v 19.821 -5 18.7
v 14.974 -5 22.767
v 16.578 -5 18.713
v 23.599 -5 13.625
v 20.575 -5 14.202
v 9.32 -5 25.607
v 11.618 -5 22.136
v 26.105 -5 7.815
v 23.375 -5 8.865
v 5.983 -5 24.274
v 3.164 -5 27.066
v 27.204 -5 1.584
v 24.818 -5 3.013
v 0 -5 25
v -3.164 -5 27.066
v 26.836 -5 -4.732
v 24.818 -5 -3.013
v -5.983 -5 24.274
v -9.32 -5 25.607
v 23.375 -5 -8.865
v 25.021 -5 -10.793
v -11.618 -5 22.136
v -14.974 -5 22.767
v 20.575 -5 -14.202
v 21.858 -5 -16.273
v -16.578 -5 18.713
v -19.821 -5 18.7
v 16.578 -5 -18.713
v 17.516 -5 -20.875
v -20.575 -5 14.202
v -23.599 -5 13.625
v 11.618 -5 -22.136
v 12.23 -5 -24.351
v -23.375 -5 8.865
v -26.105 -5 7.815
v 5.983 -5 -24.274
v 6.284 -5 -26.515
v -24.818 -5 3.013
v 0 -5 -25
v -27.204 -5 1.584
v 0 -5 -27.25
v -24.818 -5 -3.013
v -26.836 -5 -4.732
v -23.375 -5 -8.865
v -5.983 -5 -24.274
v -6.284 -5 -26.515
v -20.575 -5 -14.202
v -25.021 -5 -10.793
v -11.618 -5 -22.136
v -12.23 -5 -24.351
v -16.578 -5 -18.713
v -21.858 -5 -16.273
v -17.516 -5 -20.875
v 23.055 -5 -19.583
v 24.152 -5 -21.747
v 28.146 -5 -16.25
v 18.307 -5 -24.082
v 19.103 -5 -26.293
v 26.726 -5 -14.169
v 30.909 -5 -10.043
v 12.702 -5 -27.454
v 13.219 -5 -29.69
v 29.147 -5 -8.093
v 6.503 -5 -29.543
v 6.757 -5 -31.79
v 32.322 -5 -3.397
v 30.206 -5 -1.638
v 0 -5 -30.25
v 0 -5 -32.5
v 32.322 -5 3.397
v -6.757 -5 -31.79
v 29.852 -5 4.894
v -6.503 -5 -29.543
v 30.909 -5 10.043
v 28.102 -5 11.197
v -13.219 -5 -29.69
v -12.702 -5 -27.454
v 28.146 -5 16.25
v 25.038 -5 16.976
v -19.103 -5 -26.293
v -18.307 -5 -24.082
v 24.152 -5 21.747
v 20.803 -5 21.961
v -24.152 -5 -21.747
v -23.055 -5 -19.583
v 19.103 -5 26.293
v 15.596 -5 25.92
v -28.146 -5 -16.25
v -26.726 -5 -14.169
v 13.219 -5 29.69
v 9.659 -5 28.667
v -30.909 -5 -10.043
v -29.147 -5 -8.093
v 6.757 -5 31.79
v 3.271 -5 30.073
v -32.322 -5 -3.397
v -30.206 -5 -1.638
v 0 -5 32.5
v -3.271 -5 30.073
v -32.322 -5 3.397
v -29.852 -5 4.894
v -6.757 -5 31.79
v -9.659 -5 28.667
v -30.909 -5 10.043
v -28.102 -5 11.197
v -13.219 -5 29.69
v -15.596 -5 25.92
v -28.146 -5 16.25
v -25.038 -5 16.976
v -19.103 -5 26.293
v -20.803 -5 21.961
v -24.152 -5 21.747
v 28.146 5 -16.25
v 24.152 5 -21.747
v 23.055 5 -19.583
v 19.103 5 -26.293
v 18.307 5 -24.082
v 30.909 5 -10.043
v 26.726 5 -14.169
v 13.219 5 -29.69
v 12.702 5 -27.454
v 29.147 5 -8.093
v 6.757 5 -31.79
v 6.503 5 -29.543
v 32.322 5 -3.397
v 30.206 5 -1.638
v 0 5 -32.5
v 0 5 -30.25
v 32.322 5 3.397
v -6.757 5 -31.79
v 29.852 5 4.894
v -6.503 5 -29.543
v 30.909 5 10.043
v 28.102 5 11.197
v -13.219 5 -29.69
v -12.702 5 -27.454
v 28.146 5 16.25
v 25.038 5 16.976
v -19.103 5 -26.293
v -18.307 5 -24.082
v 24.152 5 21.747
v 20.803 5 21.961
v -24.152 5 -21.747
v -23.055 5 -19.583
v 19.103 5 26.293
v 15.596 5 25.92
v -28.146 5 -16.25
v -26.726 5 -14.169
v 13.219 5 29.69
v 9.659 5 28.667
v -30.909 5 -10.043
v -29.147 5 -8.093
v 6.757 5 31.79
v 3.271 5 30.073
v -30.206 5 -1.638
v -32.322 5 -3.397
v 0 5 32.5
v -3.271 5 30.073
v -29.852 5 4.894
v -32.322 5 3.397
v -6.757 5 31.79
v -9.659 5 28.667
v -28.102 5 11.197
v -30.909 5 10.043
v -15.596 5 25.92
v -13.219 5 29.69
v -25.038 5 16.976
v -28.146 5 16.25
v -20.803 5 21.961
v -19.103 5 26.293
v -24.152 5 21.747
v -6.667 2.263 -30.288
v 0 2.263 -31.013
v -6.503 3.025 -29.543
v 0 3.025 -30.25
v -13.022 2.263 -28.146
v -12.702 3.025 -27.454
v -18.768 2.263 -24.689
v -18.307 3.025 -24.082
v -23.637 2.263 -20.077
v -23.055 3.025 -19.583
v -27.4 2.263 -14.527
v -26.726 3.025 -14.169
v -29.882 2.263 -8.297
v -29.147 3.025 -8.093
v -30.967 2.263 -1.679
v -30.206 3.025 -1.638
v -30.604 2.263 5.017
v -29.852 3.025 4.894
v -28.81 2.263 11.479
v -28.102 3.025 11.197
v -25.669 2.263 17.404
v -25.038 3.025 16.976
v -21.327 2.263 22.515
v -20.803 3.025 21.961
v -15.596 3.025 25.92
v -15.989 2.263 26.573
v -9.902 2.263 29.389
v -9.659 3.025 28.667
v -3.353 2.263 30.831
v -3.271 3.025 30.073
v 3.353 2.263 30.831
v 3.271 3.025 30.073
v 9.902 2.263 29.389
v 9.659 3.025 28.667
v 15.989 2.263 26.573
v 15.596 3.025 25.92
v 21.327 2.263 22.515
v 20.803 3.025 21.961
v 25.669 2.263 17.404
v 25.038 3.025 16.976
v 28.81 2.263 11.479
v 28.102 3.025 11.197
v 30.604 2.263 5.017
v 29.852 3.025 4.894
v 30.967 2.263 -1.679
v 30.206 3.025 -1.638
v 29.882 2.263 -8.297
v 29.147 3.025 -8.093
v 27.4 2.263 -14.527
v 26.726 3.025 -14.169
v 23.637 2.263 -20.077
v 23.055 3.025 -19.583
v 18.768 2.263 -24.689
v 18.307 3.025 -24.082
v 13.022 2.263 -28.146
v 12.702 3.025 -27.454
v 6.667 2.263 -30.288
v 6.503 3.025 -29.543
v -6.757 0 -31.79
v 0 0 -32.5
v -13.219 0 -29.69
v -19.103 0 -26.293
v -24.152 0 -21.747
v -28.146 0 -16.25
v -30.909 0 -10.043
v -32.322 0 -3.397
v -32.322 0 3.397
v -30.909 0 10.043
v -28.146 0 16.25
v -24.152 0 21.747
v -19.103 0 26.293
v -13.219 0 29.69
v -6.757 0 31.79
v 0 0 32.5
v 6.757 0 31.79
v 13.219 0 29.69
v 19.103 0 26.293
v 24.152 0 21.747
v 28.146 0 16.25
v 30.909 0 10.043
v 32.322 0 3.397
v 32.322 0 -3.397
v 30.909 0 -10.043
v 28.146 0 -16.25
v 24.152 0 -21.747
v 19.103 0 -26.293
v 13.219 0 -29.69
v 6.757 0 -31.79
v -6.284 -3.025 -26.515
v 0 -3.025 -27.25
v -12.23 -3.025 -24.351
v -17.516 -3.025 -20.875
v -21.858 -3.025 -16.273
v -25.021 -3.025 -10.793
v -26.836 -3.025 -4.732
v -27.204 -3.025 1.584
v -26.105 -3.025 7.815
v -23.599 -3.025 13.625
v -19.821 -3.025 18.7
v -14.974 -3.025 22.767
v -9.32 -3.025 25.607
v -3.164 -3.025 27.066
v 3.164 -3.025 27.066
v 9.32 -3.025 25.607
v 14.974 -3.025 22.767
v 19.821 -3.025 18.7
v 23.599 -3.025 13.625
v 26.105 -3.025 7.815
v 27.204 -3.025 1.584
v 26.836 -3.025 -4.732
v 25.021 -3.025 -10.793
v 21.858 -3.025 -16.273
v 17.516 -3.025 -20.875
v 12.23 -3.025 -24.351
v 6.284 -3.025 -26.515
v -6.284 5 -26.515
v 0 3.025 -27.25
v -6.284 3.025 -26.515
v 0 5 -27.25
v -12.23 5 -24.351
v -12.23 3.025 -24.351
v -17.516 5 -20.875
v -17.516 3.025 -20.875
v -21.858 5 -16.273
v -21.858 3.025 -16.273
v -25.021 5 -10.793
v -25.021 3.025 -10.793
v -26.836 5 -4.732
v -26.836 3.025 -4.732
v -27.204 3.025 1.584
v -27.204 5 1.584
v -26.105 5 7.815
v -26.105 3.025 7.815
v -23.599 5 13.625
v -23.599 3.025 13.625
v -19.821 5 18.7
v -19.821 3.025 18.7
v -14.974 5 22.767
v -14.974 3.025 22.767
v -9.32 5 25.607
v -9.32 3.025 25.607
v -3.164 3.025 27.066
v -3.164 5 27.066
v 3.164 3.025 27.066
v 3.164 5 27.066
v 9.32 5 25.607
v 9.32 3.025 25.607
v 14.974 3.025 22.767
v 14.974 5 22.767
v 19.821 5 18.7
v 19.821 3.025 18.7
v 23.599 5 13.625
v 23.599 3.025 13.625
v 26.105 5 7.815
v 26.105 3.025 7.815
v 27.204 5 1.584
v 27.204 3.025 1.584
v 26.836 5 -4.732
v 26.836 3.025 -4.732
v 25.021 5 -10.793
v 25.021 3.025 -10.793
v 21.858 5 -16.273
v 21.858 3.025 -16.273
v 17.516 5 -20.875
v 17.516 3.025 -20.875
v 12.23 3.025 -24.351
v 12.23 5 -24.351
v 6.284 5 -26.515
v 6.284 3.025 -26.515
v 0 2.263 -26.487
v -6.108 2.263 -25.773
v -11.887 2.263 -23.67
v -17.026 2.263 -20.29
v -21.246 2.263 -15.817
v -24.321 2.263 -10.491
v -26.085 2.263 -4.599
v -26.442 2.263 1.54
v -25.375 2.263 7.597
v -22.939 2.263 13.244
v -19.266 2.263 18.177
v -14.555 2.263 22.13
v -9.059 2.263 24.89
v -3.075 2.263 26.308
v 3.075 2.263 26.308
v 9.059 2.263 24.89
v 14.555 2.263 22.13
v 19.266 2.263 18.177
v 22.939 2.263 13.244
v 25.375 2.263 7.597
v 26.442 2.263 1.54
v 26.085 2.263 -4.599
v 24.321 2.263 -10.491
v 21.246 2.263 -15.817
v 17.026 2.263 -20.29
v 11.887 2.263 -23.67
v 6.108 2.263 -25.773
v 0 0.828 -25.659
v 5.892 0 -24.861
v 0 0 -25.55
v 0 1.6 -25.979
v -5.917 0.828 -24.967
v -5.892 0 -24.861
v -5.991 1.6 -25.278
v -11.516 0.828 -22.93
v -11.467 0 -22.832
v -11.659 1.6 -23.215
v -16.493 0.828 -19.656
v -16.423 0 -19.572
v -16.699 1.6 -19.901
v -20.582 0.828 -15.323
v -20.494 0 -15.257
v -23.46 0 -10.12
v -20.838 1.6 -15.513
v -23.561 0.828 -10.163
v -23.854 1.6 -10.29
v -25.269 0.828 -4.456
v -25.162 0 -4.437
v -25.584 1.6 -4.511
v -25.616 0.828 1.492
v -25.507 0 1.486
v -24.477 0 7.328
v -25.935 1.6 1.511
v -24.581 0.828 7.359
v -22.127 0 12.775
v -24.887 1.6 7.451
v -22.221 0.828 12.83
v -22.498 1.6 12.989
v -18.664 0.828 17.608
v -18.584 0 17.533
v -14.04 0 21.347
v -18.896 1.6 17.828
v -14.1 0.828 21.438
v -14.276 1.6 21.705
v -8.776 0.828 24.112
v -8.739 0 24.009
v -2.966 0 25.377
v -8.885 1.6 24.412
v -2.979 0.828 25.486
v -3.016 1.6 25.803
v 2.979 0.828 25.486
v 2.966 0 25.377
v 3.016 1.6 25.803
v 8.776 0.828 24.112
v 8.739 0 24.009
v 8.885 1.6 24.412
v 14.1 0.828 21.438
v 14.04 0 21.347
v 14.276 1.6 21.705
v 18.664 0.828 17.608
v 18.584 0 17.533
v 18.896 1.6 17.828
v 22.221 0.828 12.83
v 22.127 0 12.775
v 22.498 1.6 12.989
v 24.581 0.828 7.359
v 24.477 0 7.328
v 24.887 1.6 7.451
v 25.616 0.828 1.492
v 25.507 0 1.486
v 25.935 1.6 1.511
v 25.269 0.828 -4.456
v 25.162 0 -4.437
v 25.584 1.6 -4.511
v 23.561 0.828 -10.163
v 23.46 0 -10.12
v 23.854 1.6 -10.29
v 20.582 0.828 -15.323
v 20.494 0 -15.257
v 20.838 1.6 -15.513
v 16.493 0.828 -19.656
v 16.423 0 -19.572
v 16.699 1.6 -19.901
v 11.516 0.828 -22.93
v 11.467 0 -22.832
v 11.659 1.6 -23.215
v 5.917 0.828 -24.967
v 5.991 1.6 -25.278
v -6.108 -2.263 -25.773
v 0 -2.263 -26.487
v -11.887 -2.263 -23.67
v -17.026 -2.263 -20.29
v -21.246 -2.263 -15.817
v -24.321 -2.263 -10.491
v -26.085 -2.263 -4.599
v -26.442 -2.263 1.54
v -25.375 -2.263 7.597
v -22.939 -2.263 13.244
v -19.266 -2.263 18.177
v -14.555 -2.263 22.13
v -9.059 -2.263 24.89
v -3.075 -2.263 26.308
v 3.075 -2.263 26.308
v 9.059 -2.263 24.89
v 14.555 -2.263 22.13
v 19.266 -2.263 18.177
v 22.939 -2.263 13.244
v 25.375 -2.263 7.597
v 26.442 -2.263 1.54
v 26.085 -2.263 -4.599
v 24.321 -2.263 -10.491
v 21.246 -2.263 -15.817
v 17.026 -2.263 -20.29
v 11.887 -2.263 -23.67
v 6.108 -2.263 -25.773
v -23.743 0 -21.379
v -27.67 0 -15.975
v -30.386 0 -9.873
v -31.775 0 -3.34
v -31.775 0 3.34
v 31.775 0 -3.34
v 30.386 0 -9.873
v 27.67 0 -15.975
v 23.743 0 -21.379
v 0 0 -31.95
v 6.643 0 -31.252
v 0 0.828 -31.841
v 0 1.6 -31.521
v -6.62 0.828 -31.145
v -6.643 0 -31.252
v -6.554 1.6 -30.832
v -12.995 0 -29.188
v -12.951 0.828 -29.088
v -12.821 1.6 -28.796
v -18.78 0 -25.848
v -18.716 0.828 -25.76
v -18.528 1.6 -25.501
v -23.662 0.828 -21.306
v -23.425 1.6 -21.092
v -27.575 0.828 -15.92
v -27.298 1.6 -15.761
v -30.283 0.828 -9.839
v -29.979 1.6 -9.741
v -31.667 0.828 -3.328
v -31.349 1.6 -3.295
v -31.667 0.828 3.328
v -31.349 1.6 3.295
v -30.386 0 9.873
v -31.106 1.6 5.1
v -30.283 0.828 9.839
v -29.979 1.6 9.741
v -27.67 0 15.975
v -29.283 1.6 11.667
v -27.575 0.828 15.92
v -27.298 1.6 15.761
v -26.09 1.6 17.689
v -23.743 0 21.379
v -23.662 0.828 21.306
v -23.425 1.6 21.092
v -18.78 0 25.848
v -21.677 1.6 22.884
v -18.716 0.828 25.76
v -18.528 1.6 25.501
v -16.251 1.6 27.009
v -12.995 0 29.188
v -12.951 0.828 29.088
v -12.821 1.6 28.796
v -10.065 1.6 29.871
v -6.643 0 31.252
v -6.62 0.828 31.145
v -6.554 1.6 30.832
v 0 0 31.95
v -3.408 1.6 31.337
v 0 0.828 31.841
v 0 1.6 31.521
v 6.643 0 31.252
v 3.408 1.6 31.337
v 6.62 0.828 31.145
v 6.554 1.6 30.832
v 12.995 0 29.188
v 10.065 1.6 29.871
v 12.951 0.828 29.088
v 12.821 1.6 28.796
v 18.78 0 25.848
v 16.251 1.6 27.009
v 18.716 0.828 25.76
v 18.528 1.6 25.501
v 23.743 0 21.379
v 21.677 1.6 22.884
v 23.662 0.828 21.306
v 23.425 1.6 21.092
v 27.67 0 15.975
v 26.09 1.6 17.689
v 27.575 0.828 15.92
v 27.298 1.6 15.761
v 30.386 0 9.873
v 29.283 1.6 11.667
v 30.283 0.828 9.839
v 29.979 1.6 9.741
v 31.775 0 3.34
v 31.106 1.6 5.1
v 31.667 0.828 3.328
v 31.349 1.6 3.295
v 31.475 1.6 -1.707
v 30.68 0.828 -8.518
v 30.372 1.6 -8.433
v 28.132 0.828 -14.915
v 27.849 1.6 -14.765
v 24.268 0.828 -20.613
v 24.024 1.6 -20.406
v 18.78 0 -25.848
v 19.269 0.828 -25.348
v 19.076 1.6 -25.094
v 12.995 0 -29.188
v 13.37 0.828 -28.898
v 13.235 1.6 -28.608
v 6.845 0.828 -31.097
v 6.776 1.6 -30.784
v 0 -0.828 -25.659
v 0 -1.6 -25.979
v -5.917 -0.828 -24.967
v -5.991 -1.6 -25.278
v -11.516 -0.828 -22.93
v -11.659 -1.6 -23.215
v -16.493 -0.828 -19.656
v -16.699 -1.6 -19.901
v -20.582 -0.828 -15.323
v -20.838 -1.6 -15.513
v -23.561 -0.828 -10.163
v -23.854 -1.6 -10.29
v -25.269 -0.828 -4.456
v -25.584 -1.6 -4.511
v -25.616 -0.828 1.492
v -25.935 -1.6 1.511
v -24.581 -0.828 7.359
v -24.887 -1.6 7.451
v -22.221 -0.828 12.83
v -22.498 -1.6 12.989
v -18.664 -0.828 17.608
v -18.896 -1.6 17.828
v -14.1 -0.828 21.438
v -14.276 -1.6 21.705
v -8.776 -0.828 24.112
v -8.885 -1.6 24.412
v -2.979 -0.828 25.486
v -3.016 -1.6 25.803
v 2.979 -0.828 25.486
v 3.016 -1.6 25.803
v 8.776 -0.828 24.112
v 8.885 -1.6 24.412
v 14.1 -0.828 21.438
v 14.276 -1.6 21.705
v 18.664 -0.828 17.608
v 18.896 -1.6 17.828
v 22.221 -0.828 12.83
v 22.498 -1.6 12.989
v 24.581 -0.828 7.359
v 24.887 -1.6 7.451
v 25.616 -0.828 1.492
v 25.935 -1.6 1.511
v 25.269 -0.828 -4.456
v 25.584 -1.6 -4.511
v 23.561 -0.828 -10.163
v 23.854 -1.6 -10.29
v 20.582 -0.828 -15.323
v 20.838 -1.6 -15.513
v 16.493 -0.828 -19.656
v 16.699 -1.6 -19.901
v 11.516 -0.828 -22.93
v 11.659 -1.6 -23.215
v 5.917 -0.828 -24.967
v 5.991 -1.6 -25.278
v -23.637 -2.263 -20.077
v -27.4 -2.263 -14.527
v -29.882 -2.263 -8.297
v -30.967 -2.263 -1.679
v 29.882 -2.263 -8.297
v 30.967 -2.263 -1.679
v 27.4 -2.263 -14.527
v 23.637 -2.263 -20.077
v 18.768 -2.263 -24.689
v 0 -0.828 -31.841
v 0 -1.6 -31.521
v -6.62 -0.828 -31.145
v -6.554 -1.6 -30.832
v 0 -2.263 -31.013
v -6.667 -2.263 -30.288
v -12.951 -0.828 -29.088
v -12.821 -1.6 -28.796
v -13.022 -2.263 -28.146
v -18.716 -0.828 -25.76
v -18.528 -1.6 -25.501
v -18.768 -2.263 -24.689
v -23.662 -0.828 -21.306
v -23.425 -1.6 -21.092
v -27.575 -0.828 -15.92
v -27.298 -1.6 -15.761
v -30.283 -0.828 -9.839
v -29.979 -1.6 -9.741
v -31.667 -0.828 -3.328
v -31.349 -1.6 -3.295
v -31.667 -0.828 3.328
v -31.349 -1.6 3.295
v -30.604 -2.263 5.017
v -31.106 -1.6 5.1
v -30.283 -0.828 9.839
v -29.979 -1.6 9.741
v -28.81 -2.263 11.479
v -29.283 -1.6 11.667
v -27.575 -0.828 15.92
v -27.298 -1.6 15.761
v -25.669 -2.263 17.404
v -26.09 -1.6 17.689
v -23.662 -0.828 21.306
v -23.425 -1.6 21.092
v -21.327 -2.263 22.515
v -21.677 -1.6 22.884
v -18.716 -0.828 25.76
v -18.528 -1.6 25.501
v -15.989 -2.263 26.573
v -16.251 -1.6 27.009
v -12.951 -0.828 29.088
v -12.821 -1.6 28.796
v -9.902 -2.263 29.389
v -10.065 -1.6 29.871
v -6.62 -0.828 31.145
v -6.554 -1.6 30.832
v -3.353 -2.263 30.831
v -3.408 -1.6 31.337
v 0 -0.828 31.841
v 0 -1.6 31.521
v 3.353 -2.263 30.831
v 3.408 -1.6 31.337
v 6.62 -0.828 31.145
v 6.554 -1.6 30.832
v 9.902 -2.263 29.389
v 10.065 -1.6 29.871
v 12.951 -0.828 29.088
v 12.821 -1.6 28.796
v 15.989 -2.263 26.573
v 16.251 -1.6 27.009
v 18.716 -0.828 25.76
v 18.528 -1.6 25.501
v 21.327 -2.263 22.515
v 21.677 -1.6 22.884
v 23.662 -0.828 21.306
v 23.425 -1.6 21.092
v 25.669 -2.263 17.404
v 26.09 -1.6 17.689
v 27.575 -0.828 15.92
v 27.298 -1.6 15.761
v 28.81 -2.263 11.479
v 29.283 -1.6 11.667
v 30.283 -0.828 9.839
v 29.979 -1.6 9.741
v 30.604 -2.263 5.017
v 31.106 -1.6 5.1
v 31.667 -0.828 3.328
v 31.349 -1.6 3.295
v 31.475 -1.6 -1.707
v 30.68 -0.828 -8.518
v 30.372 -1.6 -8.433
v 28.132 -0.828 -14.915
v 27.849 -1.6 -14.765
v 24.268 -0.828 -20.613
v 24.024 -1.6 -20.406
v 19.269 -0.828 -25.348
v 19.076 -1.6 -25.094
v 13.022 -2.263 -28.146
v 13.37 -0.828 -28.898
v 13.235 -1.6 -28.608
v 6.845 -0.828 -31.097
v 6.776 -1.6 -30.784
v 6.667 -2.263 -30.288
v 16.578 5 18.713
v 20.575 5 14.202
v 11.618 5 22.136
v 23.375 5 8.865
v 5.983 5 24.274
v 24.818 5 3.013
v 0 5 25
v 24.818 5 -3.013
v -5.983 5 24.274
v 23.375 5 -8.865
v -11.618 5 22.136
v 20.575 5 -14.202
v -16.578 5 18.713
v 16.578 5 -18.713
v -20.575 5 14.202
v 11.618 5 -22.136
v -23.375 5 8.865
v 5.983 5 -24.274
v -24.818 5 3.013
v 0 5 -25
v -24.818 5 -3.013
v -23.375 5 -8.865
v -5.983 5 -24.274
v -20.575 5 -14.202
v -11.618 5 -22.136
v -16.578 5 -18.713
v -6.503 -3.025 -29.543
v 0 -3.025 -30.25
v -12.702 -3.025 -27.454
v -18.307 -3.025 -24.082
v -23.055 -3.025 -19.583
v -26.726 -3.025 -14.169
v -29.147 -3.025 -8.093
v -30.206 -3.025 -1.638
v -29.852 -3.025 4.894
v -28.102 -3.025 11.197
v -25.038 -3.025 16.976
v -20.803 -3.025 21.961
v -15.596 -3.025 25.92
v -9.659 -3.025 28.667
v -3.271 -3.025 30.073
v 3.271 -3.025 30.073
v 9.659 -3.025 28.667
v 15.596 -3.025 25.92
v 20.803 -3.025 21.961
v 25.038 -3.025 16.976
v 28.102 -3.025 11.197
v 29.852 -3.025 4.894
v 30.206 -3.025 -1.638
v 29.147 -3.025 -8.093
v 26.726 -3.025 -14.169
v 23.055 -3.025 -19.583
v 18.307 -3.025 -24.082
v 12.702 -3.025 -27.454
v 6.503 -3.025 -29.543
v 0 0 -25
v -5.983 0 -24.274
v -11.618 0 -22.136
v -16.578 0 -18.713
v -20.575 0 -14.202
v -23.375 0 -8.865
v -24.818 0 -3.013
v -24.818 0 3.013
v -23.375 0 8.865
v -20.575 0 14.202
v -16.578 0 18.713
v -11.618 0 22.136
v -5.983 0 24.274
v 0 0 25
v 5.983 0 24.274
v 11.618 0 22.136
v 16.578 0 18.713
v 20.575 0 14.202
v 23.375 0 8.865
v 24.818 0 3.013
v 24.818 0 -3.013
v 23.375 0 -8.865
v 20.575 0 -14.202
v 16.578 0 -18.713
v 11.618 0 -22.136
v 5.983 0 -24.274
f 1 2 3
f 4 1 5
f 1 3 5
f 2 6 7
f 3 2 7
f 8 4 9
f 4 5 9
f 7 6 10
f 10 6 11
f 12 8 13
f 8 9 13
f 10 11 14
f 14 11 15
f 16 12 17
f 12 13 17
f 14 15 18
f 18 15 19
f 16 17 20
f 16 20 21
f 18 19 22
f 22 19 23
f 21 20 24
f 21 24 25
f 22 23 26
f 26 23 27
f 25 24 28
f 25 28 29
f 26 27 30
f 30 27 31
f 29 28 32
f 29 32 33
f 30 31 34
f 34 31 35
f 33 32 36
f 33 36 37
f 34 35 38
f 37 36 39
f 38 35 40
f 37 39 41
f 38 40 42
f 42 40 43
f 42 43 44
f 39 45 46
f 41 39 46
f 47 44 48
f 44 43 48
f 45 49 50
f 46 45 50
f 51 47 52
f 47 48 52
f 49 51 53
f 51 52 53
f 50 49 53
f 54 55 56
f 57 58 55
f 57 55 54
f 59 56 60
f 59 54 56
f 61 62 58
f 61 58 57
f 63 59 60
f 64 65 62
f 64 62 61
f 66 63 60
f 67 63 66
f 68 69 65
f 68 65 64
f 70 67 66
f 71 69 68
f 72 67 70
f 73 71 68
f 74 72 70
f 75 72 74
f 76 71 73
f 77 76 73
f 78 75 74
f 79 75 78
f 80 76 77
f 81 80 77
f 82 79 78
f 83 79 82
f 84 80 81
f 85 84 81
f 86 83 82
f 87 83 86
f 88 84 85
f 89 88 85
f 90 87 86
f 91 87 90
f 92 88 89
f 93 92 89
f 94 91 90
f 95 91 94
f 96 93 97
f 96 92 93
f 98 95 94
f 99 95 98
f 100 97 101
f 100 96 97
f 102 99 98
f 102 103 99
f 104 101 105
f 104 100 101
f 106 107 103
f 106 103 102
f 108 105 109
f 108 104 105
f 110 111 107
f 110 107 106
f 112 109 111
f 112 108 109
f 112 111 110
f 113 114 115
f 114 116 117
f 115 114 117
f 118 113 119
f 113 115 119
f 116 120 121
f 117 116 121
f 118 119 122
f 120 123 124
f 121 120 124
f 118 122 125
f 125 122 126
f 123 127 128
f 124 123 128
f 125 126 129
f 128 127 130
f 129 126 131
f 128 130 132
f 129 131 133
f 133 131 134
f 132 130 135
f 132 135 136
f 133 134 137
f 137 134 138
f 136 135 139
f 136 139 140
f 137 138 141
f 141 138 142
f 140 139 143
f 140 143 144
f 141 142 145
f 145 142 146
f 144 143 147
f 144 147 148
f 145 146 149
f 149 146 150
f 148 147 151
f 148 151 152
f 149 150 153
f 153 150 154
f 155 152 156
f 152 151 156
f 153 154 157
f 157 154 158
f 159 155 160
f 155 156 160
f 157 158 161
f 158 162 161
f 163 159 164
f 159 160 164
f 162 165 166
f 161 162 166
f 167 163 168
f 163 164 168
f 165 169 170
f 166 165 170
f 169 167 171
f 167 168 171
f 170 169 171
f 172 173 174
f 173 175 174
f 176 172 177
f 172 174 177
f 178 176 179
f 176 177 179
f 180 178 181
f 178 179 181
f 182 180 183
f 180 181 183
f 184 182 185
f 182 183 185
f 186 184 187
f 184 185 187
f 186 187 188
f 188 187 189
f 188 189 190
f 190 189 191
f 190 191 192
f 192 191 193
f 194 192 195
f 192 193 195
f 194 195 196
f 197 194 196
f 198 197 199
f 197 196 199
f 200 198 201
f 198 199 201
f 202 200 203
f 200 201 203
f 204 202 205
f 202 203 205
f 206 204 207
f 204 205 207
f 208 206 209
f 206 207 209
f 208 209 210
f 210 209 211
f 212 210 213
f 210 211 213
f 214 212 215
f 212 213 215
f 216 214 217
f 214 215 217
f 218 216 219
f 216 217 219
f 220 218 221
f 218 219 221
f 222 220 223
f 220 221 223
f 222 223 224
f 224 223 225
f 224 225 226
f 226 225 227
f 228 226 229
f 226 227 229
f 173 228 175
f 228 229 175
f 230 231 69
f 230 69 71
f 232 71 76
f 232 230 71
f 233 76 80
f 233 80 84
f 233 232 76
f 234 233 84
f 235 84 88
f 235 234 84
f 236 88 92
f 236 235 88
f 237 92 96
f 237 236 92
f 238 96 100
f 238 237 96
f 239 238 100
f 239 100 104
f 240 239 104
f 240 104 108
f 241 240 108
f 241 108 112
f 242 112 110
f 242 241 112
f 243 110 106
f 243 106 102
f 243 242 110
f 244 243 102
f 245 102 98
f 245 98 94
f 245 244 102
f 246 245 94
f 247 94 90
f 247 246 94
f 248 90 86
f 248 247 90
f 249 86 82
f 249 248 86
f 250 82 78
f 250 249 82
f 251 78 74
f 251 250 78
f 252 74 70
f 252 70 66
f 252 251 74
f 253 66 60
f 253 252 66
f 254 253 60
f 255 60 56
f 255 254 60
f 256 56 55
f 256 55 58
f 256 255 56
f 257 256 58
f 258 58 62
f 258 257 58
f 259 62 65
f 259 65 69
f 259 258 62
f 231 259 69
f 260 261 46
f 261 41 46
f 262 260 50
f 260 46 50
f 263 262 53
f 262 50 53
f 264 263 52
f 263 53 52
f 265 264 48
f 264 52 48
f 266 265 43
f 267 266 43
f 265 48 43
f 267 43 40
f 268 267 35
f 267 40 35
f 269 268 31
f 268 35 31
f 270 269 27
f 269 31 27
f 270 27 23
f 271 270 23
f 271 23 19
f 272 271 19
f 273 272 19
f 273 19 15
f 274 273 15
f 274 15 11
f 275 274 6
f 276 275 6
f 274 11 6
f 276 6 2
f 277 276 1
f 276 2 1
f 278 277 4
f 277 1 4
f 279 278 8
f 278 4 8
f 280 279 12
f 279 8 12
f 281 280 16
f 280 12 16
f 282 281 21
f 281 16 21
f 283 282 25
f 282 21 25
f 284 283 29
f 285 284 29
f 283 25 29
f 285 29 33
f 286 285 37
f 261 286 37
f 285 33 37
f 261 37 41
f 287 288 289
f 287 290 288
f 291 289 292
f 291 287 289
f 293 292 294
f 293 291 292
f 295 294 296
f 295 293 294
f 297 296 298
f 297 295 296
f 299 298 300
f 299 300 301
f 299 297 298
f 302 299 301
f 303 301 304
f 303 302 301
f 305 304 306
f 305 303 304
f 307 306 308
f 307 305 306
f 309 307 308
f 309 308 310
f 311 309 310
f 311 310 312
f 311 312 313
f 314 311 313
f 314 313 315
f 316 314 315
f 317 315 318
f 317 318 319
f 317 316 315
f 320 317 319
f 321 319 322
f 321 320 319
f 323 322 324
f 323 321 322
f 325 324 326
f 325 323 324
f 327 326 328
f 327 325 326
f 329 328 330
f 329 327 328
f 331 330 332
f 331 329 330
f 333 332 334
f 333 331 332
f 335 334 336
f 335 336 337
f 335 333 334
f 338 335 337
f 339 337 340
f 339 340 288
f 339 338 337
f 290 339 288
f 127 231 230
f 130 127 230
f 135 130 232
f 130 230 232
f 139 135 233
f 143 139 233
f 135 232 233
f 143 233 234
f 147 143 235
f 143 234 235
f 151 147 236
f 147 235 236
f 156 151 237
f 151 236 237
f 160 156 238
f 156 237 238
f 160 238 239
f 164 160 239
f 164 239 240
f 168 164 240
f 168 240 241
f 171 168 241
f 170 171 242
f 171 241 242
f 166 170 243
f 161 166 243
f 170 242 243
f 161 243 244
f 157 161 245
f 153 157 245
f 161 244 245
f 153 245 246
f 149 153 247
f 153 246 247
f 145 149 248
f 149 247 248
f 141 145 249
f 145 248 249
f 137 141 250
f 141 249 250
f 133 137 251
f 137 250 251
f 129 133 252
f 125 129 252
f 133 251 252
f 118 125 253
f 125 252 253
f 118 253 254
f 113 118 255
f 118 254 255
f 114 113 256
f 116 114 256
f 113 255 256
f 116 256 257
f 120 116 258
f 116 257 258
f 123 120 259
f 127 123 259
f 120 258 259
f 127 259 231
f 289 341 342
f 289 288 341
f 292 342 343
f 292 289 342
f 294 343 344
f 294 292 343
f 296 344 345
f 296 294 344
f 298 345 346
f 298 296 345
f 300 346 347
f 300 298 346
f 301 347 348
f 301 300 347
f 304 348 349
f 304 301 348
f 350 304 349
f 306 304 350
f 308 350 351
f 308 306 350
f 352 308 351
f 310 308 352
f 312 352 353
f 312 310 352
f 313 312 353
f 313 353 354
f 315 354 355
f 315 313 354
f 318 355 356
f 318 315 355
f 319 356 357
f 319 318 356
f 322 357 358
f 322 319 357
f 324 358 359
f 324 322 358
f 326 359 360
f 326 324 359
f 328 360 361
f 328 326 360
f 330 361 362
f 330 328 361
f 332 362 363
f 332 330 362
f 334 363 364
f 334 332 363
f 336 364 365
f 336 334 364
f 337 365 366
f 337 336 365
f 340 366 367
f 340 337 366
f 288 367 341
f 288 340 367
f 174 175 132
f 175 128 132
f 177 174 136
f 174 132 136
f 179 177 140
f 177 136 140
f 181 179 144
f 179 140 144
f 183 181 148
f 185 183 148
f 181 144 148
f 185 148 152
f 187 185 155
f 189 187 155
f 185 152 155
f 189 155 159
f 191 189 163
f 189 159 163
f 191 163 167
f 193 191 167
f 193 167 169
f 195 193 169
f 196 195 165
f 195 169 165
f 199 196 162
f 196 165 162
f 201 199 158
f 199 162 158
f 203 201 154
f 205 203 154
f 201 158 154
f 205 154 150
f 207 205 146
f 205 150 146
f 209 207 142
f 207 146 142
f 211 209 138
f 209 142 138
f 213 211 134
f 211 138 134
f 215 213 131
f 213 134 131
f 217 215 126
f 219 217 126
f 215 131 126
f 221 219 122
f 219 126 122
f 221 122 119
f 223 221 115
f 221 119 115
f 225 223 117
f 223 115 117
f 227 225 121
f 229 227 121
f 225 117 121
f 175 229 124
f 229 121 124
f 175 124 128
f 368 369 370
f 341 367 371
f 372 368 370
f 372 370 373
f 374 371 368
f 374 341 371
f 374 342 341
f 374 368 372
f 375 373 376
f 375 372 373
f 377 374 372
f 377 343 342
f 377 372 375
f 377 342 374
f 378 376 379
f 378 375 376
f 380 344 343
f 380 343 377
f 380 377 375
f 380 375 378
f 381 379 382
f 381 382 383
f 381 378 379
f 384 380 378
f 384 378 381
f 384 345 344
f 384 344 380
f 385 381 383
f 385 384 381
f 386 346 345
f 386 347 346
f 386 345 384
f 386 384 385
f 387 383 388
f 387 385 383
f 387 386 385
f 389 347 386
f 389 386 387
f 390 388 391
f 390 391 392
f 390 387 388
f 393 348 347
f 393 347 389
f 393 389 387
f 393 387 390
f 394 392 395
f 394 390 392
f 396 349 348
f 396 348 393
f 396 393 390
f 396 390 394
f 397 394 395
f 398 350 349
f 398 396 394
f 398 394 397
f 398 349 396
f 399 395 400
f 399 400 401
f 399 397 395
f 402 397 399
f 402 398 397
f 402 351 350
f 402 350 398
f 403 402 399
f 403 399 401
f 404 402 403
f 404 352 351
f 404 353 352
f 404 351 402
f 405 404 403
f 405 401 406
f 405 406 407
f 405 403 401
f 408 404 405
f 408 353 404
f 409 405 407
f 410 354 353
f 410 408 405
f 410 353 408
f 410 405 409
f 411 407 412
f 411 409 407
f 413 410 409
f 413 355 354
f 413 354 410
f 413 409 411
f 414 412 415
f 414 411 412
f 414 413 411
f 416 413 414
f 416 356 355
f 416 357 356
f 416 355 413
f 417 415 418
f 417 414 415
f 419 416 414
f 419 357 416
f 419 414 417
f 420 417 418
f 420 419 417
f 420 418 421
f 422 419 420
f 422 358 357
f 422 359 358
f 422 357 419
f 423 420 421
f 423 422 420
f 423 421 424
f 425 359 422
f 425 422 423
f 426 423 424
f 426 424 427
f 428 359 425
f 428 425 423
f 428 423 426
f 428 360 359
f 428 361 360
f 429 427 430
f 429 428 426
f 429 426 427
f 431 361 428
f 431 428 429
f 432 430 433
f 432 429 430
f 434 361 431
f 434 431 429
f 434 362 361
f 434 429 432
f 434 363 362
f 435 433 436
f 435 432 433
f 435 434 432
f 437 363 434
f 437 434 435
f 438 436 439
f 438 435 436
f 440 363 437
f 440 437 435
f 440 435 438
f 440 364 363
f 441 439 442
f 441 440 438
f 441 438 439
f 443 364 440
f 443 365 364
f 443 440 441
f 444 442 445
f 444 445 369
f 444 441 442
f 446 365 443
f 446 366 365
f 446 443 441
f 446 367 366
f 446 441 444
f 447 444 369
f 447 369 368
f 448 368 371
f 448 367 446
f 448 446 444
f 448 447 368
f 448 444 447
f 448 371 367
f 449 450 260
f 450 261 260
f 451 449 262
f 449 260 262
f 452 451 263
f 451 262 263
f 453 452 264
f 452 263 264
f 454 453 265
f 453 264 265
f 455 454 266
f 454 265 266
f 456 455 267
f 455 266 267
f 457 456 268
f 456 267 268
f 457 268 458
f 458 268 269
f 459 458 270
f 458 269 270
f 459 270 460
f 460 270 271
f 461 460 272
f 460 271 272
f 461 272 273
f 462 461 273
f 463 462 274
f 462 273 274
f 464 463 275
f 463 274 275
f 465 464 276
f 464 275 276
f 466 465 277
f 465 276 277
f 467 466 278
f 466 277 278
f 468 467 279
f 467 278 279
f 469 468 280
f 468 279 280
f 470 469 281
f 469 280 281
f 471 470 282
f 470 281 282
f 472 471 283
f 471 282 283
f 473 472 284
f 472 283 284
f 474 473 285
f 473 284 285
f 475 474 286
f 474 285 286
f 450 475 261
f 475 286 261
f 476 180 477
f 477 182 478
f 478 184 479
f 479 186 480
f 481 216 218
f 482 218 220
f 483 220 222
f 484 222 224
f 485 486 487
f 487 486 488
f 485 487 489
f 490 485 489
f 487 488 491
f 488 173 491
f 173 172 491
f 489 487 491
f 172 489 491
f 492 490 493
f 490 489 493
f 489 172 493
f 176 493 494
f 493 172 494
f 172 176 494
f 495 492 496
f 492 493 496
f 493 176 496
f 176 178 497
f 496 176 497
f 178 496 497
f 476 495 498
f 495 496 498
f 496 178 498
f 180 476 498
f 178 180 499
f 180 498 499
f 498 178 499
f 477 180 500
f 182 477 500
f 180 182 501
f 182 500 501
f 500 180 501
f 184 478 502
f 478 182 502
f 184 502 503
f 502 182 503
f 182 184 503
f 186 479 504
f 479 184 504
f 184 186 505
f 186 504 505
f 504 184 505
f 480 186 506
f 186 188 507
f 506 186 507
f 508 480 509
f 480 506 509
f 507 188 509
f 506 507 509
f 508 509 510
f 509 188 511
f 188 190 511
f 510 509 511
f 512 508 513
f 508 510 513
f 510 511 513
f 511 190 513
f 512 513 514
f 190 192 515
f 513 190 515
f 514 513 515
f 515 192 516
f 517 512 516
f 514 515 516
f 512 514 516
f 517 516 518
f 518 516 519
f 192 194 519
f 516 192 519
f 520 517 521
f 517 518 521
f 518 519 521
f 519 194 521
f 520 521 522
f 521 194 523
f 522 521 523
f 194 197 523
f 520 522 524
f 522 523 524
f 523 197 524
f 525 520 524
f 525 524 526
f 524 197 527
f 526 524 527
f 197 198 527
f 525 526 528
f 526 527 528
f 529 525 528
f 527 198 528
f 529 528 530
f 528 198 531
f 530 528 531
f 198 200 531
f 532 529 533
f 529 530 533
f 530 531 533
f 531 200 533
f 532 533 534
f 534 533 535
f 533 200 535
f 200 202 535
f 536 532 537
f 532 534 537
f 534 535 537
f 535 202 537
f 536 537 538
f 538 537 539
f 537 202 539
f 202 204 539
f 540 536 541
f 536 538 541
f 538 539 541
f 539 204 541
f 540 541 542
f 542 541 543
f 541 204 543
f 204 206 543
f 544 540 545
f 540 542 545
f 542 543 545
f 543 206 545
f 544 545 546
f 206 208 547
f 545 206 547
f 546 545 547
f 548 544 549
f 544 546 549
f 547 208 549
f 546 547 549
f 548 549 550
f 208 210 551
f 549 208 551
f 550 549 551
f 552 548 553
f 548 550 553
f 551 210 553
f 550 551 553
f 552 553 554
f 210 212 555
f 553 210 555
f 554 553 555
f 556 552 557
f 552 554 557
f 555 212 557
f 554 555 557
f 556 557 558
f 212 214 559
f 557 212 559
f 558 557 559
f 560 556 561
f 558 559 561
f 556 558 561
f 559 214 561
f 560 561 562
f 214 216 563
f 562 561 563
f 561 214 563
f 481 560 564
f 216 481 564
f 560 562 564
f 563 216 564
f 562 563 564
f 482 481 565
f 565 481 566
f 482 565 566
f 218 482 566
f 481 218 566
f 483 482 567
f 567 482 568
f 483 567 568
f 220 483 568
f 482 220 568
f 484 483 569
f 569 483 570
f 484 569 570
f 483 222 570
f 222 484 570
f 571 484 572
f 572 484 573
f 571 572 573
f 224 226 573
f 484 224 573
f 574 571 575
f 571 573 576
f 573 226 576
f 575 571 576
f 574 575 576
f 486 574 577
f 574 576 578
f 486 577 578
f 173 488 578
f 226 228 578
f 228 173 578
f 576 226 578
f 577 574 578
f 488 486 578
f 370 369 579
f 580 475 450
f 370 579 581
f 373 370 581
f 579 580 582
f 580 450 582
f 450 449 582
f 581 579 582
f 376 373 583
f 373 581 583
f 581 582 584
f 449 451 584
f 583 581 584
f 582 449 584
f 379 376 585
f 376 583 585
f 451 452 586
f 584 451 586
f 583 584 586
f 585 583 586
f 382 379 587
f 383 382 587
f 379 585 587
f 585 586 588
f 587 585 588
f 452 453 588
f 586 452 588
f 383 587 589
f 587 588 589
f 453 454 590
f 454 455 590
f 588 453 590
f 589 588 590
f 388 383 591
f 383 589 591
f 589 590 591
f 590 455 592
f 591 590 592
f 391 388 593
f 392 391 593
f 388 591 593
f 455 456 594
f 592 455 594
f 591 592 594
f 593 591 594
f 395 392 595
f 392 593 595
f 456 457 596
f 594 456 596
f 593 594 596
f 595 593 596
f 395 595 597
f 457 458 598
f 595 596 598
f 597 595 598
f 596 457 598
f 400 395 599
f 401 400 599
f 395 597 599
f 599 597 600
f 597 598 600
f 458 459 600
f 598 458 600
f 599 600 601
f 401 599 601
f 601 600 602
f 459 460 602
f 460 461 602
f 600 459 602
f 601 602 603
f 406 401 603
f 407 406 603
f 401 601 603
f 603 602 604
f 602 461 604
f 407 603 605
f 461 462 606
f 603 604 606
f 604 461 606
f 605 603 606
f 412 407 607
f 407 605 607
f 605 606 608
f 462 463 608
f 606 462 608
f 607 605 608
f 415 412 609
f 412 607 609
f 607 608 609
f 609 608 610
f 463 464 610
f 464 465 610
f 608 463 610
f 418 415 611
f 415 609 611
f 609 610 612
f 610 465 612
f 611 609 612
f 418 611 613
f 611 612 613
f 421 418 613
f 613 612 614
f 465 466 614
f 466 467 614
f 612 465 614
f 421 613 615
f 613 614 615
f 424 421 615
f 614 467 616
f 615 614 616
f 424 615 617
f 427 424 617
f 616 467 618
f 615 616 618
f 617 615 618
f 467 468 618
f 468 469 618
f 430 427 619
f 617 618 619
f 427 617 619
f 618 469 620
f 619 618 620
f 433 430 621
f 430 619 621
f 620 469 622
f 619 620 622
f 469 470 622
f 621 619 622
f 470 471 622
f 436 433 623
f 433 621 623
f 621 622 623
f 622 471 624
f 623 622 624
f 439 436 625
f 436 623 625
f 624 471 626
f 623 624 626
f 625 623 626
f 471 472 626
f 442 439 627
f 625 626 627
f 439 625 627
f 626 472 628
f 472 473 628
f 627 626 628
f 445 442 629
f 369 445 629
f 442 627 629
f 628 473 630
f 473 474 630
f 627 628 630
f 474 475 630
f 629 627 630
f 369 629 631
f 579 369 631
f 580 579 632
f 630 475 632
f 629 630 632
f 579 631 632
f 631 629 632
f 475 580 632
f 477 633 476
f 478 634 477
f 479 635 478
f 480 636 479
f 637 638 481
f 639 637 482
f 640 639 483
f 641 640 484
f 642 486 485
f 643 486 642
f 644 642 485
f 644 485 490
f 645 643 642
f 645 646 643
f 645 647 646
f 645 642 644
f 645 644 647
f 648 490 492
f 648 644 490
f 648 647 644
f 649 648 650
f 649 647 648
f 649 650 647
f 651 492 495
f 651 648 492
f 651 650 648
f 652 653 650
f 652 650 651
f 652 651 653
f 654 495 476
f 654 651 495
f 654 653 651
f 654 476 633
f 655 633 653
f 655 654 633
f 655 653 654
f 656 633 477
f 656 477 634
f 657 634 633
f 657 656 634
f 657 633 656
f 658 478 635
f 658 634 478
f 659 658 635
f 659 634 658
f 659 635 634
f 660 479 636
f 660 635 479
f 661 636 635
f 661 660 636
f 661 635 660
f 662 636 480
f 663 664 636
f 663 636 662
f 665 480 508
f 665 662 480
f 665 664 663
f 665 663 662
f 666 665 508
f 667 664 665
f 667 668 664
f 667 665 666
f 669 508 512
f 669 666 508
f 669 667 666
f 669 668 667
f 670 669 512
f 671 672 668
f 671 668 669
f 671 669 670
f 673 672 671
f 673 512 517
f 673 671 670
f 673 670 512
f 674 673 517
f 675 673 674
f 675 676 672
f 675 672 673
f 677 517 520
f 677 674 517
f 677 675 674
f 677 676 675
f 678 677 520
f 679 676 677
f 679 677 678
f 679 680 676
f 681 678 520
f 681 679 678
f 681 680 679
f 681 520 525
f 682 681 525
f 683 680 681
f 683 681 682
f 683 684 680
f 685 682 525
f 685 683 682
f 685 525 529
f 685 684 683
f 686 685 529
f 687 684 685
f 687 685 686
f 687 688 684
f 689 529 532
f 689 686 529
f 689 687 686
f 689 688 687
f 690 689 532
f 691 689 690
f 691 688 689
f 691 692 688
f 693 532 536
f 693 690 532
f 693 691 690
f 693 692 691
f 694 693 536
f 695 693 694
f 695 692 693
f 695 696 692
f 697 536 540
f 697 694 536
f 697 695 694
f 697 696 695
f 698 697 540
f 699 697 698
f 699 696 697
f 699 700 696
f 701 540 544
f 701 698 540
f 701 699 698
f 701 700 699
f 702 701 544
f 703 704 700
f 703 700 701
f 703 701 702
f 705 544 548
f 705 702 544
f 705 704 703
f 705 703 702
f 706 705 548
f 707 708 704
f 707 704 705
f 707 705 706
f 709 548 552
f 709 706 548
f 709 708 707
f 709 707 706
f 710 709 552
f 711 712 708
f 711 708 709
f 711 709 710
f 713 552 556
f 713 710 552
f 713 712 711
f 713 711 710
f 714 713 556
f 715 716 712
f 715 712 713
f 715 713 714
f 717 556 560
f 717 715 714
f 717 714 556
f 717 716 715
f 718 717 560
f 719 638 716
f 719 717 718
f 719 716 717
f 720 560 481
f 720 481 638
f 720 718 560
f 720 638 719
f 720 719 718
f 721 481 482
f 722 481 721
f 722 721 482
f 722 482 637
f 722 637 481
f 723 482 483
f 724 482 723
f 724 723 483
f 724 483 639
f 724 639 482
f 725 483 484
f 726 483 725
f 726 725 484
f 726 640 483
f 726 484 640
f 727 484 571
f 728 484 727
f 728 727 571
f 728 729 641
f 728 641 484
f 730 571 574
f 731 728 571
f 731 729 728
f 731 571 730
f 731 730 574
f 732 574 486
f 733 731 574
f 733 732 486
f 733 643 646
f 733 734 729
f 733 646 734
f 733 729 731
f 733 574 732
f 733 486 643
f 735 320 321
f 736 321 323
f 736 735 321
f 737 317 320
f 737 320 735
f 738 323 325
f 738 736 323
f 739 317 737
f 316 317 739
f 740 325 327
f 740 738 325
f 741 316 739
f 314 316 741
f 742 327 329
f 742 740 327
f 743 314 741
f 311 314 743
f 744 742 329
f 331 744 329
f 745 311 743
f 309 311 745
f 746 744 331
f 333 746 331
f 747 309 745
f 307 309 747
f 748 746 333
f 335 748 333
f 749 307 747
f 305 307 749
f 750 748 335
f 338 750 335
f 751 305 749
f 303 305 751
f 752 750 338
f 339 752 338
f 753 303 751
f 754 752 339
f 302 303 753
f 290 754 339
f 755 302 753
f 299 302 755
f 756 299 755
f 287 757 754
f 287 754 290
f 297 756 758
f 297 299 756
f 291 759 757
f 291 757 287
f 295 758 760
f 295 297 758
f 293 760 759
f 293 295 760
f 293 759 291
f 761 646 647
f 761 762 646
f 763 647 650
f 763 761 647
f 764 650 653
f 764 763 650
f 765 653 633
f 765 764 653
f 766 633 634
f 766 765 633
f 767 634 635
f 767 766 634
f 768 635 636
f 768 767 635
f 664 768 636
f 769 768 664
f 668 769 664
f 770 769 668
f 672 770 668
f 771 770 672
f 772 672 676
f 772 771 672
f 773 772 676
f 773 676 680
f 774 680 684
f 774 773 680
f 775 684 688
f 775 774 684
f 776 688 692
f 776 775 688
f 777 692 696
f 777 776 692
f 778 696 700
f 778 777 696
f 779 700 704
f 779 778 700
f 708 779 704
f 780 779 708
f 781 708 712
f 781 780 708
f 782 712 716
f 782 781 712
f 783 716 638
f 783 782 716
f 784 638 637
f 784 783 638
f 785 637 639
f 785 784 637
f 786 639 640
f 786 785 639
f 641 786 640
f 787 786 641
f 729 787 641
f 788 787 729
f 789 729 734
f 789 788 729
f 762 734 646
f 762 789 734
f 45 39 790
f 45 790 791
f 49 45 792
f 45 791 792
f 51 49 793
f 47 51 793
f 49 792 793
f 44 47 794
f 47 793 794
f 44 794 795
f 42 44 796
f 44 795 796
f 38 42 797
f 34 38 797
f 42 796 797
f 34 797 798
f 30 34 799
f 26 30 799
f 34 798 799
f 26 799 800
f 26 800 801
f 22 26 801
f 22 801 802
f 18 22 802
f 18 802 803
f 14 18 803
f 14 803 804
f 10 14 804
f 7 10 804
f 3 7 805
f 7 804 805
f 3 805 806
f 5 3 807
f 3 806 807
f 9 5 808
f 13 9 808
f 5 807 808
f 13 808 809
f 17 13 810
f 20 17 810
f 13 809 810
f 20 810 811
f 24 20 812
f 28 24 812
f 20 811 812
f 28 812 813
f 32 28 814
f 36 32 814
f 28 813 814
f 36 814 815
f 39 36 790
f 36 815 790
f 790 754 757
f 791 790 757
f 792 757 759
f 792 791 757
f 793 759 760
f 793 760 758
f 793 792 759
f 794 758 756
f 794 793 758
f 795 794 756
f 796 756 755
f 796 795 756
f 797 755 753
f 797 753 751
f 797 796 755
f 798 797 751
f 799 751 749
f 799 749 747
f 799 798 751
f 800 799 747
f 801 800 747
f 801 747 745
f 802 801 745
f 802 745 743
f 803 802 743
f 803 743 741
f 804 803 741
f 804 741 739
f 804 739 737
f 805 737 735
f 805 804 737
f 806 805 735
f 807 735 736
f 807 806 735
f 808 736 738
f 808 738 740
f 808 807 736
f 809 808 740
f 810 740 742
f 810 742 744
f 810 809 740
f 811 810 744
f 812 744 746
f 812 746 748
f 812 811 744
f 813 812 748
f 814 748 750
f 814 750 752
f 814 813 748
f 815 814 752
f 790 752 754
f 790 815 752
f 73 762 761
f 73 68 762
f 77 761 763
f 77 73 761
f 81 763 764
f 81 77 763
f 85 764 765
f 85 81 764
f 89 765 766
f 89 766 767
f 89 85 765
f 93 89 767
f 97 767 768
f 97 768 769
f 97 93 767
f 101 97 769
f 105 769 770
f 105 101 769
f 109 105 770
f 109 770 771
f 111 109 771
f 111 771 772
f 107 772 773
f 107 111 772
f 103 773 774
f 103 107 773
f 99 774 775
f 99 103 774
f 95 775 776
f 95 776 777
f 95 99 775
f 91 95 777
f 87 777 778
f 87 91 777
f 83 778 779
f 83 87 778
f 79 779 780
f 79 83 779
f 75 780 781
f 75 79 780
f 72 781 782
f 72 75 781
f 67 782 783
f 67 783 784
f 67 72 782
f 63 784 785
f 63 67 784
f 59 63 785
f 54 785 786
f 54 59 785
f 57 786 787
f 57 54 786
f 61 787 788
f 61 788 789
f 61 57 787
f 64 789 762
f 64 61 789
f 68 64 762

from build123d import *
from build123d.topology import SkipClean


with BuildPart() as part:
    # Sketch2 → Revolve1 (revolve)
    with BuildSketch(Plane.XY, mode=Mode.PRIVATE) as revolve1_sk:
        with BuildLine():
            Line((26.4872583, 2.2627417), (27.25, 3.0254834))
            Line((27.25, 3.0254834), (27.25, 5))
            Line((27.25, 5), (25, 5))
            Line((25, 5), (25, 0))
            Line((25, 0), (25.55, 0))
            ThreePointArc((25.55, 0), (25.793585496, 1.224586984), (26.4872583, 2.2627417))
        make_face()
        with BuildLine():
            Line((30.25, 5), (32.5, 5))
            Line((32.5, 5), (32.5, 0))
            Line((32.5, 0), (31.95, 0))
            ThreePointArc((31.95, 0), (31.706414504, 1.224586984), (31.0127417, 2.2627417))
            Line((31.0127417, 2.2627417), (30.25, 3.0254834))
            Line((30.25, 3.0254834), (30.25, 5))
        make_face()
    revolve(revolve1_sk.sketch.rotate(Axis((0, 0, 0), (0, 1, 0)), 90), axis=Axis((0, 0, 0), (0, 1, 0)))

    # Mirror1: part across plane


with BuildPart() as part_1:
    with SkipClean():  # the faces are left unmerged after this step: merging them gives an invalid solid
        add(part.part)
        add(part.part.mirror(Plane.ZX))


solid = part_1.part
